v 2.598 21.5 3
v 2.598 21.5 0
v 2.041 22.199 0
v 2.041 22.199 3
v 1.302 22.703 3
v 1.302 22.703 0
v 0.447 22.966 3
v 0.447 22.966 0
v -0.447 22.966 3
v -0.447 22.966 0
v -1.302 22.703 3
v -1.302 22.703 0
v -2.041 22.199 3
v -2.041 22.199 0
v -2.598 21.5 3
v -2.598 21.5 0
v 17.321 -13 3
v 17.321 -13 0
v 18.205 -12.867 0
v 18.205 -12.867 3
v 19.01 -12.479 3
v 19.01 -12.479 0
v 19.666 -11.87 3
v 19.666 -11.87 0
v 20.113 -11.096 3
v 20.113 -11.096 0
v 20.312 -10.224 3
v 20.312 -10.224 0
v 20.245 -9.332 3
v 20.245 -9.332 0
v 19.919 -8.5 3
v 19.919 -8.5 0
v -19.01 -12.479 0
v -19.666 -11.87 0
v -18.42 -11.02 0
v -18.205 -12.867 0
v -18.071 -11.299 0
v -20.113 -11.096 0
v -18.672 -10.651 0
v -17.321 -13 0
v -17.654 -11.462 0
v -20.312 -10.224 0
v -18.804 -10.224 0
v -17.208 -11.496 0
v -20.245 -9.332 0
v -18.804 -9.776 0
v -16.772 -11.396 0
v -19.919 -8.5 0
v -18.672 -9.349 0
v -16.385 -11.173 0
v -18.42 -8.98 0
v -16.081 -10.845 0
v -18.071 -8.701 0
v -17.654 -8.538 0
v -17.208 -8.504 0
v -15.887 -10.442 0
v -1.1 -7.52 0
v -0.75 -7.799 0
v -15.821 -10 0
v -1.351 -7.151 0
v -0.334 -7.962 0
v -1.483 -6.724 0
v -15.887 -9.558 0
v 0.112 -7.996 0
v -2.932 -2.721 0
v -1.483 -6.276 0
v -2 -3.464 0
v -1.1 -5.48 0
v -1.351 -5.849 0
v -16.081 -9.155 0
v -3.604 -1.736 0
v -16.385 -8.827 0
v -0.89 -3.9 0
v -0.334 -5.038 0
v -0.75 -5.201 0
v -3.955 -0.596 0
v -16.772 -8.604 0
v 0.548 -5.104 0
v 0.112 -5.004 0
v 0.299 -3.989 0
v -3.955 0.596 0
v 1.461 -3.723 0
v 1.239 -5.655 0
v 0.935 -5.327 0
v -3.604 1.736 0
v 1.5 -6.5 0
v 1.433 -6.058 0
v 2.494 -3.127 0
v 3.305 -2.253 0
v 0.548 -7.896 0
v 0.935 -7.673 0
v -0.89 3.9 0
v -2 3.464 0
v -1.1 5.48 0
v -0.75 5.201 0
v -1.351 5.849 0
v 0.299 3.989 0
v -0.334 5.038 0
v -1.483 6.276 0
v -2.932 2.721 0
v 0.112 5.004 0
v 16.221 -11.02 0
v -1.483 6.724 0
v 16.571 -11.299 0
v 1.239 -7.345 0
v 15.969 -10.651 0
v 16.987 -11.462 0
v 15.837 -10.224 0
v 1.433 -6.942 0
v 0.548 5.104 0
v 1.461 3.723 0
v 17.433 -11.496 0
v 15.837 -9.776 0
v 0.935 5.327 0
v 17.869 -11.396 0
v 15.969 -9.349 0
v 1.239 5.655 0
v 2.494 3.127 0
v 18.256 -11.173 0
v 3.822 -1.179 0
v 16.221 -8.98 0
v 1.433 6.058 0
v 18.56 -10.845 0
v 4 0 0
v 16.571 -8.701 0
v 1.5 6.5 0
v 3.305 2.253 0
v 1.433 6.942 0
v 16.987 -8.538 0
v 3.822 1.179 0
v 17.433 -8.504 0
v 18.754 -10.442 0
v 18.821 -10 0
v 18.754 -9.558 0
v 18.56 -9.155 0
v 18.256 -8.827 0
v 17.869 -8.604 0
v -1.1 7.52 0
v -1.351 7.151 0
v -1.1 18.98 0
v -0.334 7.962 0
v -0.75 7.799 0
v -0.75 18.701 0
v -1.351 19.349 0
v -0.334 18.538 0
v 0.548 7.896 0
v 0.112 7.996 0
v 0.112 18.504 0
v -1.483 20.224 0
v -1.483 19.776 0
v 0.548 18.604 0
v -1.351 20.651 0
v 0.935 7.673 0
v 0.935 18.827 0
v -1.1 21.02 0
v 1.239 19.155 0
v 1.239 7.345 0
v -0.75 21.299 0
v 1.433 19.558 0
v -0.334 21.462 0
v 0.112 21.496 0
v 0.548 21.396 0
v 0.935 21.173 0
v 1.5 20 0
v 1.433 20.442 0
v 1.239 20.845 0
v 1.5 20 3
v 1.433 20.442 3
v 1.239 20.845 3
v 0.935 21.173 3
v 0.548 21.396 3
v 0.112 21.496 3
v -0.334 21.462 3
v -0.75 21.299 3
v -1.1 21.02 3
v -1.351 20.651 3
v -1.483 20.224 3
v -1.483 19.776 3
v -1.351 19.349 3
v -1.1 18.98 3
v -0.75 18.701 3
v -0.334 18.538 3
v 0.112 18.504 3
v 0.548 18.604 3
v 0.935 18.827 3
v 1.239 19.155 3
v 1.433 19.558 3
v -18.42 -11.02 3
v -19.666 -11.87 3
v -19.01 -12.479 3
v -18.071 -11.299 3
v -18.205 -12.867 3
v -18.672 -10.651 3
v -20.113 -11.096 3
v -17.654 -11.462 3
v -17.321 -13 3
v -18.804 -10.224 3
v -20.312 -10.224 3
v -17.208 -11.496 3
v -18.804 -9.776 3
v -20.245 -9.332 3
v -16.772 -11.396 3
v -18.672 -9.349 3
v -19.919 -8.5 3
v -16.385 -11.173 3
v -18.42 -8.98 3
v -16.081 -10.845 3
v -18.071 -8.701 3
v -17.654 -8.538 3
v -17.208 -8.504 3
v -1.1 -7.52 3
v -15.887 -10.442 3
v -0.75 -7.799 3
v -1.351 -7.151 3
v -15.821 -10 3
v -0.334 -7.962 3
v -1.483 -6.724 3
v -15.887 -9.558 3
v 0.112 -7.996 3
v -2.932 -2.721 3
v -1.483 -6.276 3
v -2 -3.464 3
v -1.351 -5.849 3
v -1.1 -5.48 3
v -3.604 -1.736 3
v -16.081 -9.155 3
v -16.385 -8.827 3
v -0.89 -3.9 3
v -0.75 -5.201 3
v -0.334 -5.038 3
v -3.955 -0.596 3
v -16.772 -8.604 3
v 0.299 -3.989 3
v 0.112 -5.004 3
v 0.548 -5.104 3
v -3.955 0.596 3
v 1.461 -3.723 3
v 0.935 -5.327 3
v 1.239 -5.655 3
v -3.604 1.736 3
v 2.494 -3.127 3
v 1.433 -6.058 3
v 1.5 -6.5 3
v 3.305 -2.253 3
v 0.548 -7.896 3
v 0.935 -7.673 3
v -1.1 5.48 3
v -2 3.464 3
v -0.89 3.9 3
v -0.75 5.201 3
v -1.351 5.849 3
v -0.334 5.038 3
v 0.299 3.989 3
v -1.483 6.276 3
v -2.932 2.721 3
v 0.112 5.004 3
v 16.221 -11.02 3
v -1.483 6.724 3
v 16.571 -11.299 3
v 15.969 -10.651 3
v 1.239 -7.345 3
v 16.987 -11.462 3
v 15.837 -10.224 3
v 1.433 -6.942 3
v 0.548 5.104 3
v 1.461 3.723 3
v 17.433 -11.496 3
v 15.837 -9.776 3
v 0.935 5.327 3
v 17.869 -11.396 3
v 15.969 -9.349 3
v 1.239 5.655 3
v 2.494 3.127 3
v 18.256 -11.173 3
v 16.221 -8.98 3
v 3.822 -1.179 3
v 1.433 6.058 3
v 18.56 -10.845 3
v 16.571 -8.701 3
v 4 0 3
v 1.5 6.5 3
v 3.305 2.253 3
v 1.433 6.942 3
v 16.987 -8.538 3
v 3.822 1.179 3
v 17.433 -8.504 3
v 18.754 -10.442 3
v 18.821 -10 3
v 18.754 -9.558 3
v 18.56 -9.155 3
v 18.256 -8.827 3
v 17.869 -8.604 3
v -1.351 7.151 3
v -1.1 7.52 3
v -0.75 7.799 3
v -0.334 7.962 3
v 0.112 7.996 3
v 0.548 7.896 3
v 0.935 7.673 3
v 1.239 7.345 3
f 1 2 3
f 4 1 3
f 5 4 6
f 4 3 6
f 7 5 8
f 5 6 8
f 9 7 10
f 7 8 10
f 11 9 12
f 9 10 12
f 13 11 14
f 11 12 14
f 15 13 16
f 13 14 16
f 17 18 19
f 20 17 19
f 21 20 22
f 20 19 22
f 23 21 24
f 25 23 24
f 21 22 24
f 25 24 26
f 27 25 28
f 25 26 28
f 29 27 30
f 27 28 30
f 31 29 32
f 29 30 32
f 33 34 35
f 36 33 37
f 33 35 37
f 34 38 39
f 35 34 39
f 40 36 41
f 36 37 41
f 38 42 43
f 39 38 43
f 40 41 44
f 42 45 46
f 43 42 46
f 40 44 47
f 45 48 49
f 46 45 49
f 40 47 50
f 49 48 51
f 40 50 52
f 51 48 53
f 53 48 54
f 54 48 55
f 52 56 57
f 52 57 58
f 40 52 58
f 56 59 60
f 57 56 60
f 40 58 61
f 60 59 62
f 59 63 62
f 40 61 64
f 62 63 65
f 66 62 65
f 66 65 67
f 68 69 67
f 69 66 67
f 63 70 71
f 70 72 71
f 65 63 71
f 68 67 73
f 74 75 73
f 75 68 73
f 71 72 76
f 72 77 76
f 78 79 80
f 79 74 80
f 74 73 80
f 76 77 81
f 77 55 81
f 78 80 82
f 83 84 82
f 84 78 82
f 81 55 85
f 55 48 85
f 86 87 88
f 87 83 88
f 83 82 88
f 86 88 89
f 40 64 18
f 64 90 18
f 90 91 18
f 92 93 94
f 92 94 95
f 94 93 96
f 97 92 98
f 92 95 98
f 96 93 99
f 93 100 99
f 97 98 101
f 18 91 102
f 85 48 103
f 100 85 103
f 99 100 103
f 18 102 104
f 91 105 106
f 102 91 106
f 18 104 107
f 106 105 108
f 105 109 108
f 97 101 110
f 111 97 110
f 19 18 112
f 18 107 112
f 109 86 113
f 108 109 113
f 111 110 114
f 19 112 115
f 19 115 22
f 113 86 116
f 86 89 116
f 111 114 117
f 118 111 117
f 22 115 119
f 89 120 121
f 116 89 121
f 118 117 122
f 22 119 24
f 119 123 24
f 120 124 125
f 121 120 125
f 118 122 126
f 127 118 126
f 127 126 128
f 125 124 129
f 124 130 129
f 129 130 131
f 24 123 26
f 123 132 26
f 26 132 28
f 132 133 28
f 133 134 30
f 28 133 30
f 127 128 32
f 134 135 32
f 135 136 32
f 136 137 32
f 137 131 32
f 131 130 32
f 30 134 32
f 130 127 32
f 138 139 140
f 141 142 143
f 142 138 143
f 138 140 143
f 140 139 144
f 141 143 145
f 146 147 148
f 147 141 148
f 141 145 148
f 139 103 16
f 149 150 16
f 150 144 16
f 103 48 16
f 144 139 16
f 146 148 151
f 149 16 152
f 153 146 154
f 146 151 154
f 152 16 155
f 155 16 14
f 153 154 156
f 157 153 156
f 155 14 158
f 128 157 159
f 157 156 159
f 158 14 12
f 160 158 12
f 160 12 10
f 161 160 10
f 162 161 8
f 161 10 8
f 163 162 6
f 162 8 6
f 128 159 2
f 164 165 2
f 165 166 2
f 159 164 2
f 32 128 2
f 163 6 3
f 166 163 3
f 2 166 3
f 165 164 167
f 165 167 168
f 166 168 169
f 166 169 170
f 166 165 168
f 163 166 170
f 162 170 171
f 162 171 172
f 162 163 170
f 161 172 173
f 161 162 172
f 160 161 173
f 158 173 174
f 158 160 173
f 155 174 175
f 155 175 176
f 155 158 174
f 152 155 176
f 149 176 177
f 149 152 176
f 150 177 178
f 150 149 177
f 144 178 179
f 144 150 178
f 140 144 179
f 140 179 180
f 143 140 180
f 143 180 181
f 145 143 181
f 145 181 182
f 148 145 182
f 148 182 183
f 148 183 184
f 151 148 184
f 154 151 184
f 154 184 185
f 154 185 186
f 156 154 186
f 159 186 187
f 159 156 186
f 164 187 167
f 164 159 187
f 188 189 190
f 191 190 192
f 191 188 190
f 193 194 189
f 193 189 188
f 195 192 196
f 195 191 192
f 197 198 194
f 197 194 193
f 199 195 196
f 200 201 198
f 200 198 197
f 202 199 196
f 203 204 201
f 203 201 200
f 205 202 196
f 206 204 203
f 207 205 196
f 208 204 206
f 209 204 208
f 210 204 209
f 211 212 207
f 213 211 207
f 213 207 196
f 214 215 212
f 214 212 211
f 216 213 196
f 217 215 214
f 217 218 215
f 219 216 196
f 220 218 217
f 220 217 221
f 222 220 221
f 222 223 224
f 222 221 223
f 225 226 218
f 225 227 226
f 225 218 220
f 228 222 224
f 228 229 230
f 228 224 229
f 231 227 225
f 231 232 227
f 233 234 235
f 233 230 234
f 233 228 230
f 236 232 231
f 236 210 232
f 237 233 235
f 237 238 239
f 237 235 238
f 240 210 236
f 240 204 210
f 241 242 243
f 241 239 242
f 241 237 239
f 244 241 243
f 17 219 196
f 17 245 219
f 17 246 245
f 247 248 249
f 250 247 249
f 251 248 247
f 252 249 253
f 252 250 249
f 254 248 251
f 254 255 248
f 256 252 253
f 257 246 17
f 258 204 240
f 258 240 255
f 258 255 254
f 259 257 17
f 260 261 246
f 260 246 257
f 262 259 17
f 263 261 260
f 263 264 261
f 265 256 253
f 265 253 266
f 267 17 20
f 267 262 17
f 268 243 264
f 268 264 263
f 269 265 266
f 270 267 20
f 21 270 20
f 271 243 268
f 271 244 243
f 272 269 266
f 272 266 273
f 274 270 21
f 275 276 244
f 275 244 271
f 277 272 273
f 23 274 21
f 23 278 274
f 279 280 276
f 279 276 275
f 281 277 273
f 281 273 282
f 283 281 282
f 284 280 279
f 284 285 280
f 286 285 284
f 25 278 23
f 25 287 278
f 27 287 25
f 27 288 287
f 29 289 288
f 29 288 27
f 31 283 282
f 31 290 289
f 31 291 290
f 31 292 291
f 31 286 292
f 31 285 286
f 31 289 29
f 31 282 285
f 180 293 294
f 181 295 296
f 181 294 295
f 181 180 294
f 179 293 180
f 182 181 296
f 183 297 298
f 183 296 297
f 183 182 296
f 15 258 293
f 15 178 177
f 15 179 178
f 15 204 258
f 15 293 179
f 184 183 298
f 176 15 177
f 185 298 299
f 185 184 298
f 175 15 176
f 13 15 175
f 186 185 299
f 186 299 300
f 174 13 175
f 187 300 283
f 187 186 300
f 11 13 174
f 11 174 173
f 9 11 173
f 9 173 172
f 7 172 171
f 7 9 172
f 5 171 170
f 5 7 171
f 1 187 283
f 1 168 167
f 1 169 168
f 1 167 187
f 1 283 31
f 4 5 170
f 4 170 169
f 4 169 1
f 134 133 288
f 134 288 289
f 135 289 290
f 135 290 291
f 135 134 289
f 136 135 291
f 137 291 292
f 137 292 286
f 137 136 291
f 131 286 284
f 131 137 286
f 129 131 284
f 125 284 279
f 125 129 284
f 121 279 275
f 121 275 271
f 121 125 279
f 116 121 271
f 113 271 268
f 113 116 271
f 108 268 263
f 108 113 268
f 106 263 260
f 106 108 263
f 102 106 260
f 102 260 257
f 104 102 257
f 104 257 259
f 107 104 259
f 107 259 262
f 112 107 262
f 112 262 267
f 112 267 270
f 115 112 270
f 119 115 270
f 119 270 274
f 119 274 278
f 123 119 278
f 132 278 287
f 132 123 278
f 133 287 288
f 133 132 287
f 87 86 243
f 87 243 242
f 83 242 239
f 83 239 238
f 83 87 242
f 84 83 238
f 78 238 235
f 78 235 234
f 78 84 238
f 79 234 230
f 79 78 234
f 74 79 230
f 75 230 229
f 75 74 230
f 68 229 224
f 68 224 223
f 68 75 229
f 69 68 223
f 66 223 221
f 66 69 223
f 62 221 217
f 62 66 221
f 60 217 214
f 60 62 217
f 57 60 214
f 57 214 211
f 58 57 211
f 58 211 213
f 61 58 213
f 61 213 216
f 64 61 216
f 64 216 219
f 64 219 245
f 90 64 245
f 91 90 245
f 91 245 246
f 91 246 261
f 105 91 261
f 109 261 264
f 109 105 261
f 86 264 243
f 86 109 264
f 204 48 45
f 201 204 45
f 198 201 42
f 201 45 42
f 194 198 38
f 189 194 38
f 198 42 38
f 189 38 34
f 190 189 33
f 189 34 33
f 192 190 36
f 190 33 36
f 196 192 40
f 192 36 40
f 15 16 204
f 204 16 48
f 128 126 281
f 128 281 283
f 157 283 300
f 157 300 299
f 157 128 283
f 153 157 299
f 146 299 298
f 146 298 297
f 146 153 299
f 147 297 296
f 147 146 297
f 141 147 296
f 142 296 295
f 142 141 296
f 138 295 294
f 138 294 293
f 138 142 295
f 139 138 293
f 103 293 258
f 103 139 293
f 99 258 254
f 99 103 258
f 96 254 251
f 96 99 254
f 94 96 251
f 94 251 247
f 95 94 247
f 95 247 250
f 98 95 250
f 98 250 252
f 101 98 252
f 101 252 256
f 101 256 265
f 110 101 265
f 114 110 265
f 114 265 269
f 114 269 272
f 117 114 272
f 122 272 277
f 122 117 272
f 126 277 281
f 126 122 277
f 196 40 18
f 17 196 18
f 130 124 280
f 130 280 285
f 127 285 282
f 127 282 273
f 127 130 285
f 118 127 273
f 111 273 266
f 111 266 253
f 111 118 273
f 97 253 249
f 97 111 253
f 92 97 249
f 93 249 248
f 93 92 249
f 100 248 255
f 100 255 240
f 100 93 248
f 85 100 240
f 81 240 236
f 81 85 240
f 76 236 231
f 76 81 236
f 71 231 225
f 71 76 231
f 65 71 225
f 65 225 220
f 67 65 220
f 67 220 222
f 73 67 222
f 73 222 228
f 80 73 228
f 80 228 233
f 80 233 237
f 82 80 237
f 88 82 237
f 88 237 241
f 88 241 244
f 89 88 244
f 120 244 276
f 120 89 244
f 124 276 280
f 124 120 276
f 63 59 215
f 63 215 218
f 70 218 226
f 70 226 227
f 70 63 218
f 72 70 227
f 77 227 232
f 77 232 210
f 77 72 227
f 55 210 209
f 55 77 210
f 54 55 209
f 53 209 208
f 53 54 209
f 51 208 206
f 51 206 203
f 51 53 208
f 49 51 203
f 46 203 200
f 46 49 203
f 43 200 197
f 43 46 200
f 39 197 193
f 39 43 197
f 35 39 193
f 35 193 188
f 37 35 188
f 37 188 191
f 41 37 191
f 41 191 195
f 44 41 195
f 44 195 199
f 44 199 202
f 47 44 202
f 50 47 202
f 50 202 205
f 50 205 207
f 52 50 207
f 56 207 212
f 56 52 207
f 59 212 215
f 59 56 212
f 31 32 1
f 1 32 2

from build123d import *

# Parameters (mm, degrees)
SKETCH_1_R      = 1.5
SKETCH_1_R_2    = 4
EXTRUDE_1_DEPTH = 3


with BuildPart() as part:
    # 草图1 → 凸台-拉伸1 (new body)
    with BuildSketch(Plane.XY):
        with BuildLine():
            Line((-2.598076211, 21.5), (-19.918584287, -8.5))
            ThreePointArc((-19.918584287, -8.5), (-19.918584287, -11.5), (-17.320508076, -13))
            Line((-17.320508076, -13), (17.320508076, -13))
            ThreePointArc((17.320508076, -13), (19.918584287, -11.5), (19.918584287, -8.5))
            Line((19.918584287, -8.5), (2.598076211, 21.5))
            ThreePointArc((2.598076211, 21.5), (0, 23), (-2.598076211, 21.5))
        make_face()
        with Locations((-17.320508076, -10)):
            Circle(SKETCH_1_R, mode=Mode.SUBTRACT)
        with Locations((0, 20)):
            Circle(SKETCH_1_R, mode=Mode.SUBTRACT)
        with Locations((17.320508076, -10)):
            Circle(SKETCH_1_R, mode=Mode.SUBTRACT)
        Circle(SKETCH_1_R_2, mode=Mode.SUBTRACT)
        with Locations((0, 6.5)):
            Circle(SKETCH_1_R, mode=Mode.SUBTRACT)
        with Locations((0, -6.5)):
            Circle(SKETCH_1_R, mode=Mode.SUBTRACT)
    extrude(amount=EXTRUDE_1_DEPTH)


solid = part.part
